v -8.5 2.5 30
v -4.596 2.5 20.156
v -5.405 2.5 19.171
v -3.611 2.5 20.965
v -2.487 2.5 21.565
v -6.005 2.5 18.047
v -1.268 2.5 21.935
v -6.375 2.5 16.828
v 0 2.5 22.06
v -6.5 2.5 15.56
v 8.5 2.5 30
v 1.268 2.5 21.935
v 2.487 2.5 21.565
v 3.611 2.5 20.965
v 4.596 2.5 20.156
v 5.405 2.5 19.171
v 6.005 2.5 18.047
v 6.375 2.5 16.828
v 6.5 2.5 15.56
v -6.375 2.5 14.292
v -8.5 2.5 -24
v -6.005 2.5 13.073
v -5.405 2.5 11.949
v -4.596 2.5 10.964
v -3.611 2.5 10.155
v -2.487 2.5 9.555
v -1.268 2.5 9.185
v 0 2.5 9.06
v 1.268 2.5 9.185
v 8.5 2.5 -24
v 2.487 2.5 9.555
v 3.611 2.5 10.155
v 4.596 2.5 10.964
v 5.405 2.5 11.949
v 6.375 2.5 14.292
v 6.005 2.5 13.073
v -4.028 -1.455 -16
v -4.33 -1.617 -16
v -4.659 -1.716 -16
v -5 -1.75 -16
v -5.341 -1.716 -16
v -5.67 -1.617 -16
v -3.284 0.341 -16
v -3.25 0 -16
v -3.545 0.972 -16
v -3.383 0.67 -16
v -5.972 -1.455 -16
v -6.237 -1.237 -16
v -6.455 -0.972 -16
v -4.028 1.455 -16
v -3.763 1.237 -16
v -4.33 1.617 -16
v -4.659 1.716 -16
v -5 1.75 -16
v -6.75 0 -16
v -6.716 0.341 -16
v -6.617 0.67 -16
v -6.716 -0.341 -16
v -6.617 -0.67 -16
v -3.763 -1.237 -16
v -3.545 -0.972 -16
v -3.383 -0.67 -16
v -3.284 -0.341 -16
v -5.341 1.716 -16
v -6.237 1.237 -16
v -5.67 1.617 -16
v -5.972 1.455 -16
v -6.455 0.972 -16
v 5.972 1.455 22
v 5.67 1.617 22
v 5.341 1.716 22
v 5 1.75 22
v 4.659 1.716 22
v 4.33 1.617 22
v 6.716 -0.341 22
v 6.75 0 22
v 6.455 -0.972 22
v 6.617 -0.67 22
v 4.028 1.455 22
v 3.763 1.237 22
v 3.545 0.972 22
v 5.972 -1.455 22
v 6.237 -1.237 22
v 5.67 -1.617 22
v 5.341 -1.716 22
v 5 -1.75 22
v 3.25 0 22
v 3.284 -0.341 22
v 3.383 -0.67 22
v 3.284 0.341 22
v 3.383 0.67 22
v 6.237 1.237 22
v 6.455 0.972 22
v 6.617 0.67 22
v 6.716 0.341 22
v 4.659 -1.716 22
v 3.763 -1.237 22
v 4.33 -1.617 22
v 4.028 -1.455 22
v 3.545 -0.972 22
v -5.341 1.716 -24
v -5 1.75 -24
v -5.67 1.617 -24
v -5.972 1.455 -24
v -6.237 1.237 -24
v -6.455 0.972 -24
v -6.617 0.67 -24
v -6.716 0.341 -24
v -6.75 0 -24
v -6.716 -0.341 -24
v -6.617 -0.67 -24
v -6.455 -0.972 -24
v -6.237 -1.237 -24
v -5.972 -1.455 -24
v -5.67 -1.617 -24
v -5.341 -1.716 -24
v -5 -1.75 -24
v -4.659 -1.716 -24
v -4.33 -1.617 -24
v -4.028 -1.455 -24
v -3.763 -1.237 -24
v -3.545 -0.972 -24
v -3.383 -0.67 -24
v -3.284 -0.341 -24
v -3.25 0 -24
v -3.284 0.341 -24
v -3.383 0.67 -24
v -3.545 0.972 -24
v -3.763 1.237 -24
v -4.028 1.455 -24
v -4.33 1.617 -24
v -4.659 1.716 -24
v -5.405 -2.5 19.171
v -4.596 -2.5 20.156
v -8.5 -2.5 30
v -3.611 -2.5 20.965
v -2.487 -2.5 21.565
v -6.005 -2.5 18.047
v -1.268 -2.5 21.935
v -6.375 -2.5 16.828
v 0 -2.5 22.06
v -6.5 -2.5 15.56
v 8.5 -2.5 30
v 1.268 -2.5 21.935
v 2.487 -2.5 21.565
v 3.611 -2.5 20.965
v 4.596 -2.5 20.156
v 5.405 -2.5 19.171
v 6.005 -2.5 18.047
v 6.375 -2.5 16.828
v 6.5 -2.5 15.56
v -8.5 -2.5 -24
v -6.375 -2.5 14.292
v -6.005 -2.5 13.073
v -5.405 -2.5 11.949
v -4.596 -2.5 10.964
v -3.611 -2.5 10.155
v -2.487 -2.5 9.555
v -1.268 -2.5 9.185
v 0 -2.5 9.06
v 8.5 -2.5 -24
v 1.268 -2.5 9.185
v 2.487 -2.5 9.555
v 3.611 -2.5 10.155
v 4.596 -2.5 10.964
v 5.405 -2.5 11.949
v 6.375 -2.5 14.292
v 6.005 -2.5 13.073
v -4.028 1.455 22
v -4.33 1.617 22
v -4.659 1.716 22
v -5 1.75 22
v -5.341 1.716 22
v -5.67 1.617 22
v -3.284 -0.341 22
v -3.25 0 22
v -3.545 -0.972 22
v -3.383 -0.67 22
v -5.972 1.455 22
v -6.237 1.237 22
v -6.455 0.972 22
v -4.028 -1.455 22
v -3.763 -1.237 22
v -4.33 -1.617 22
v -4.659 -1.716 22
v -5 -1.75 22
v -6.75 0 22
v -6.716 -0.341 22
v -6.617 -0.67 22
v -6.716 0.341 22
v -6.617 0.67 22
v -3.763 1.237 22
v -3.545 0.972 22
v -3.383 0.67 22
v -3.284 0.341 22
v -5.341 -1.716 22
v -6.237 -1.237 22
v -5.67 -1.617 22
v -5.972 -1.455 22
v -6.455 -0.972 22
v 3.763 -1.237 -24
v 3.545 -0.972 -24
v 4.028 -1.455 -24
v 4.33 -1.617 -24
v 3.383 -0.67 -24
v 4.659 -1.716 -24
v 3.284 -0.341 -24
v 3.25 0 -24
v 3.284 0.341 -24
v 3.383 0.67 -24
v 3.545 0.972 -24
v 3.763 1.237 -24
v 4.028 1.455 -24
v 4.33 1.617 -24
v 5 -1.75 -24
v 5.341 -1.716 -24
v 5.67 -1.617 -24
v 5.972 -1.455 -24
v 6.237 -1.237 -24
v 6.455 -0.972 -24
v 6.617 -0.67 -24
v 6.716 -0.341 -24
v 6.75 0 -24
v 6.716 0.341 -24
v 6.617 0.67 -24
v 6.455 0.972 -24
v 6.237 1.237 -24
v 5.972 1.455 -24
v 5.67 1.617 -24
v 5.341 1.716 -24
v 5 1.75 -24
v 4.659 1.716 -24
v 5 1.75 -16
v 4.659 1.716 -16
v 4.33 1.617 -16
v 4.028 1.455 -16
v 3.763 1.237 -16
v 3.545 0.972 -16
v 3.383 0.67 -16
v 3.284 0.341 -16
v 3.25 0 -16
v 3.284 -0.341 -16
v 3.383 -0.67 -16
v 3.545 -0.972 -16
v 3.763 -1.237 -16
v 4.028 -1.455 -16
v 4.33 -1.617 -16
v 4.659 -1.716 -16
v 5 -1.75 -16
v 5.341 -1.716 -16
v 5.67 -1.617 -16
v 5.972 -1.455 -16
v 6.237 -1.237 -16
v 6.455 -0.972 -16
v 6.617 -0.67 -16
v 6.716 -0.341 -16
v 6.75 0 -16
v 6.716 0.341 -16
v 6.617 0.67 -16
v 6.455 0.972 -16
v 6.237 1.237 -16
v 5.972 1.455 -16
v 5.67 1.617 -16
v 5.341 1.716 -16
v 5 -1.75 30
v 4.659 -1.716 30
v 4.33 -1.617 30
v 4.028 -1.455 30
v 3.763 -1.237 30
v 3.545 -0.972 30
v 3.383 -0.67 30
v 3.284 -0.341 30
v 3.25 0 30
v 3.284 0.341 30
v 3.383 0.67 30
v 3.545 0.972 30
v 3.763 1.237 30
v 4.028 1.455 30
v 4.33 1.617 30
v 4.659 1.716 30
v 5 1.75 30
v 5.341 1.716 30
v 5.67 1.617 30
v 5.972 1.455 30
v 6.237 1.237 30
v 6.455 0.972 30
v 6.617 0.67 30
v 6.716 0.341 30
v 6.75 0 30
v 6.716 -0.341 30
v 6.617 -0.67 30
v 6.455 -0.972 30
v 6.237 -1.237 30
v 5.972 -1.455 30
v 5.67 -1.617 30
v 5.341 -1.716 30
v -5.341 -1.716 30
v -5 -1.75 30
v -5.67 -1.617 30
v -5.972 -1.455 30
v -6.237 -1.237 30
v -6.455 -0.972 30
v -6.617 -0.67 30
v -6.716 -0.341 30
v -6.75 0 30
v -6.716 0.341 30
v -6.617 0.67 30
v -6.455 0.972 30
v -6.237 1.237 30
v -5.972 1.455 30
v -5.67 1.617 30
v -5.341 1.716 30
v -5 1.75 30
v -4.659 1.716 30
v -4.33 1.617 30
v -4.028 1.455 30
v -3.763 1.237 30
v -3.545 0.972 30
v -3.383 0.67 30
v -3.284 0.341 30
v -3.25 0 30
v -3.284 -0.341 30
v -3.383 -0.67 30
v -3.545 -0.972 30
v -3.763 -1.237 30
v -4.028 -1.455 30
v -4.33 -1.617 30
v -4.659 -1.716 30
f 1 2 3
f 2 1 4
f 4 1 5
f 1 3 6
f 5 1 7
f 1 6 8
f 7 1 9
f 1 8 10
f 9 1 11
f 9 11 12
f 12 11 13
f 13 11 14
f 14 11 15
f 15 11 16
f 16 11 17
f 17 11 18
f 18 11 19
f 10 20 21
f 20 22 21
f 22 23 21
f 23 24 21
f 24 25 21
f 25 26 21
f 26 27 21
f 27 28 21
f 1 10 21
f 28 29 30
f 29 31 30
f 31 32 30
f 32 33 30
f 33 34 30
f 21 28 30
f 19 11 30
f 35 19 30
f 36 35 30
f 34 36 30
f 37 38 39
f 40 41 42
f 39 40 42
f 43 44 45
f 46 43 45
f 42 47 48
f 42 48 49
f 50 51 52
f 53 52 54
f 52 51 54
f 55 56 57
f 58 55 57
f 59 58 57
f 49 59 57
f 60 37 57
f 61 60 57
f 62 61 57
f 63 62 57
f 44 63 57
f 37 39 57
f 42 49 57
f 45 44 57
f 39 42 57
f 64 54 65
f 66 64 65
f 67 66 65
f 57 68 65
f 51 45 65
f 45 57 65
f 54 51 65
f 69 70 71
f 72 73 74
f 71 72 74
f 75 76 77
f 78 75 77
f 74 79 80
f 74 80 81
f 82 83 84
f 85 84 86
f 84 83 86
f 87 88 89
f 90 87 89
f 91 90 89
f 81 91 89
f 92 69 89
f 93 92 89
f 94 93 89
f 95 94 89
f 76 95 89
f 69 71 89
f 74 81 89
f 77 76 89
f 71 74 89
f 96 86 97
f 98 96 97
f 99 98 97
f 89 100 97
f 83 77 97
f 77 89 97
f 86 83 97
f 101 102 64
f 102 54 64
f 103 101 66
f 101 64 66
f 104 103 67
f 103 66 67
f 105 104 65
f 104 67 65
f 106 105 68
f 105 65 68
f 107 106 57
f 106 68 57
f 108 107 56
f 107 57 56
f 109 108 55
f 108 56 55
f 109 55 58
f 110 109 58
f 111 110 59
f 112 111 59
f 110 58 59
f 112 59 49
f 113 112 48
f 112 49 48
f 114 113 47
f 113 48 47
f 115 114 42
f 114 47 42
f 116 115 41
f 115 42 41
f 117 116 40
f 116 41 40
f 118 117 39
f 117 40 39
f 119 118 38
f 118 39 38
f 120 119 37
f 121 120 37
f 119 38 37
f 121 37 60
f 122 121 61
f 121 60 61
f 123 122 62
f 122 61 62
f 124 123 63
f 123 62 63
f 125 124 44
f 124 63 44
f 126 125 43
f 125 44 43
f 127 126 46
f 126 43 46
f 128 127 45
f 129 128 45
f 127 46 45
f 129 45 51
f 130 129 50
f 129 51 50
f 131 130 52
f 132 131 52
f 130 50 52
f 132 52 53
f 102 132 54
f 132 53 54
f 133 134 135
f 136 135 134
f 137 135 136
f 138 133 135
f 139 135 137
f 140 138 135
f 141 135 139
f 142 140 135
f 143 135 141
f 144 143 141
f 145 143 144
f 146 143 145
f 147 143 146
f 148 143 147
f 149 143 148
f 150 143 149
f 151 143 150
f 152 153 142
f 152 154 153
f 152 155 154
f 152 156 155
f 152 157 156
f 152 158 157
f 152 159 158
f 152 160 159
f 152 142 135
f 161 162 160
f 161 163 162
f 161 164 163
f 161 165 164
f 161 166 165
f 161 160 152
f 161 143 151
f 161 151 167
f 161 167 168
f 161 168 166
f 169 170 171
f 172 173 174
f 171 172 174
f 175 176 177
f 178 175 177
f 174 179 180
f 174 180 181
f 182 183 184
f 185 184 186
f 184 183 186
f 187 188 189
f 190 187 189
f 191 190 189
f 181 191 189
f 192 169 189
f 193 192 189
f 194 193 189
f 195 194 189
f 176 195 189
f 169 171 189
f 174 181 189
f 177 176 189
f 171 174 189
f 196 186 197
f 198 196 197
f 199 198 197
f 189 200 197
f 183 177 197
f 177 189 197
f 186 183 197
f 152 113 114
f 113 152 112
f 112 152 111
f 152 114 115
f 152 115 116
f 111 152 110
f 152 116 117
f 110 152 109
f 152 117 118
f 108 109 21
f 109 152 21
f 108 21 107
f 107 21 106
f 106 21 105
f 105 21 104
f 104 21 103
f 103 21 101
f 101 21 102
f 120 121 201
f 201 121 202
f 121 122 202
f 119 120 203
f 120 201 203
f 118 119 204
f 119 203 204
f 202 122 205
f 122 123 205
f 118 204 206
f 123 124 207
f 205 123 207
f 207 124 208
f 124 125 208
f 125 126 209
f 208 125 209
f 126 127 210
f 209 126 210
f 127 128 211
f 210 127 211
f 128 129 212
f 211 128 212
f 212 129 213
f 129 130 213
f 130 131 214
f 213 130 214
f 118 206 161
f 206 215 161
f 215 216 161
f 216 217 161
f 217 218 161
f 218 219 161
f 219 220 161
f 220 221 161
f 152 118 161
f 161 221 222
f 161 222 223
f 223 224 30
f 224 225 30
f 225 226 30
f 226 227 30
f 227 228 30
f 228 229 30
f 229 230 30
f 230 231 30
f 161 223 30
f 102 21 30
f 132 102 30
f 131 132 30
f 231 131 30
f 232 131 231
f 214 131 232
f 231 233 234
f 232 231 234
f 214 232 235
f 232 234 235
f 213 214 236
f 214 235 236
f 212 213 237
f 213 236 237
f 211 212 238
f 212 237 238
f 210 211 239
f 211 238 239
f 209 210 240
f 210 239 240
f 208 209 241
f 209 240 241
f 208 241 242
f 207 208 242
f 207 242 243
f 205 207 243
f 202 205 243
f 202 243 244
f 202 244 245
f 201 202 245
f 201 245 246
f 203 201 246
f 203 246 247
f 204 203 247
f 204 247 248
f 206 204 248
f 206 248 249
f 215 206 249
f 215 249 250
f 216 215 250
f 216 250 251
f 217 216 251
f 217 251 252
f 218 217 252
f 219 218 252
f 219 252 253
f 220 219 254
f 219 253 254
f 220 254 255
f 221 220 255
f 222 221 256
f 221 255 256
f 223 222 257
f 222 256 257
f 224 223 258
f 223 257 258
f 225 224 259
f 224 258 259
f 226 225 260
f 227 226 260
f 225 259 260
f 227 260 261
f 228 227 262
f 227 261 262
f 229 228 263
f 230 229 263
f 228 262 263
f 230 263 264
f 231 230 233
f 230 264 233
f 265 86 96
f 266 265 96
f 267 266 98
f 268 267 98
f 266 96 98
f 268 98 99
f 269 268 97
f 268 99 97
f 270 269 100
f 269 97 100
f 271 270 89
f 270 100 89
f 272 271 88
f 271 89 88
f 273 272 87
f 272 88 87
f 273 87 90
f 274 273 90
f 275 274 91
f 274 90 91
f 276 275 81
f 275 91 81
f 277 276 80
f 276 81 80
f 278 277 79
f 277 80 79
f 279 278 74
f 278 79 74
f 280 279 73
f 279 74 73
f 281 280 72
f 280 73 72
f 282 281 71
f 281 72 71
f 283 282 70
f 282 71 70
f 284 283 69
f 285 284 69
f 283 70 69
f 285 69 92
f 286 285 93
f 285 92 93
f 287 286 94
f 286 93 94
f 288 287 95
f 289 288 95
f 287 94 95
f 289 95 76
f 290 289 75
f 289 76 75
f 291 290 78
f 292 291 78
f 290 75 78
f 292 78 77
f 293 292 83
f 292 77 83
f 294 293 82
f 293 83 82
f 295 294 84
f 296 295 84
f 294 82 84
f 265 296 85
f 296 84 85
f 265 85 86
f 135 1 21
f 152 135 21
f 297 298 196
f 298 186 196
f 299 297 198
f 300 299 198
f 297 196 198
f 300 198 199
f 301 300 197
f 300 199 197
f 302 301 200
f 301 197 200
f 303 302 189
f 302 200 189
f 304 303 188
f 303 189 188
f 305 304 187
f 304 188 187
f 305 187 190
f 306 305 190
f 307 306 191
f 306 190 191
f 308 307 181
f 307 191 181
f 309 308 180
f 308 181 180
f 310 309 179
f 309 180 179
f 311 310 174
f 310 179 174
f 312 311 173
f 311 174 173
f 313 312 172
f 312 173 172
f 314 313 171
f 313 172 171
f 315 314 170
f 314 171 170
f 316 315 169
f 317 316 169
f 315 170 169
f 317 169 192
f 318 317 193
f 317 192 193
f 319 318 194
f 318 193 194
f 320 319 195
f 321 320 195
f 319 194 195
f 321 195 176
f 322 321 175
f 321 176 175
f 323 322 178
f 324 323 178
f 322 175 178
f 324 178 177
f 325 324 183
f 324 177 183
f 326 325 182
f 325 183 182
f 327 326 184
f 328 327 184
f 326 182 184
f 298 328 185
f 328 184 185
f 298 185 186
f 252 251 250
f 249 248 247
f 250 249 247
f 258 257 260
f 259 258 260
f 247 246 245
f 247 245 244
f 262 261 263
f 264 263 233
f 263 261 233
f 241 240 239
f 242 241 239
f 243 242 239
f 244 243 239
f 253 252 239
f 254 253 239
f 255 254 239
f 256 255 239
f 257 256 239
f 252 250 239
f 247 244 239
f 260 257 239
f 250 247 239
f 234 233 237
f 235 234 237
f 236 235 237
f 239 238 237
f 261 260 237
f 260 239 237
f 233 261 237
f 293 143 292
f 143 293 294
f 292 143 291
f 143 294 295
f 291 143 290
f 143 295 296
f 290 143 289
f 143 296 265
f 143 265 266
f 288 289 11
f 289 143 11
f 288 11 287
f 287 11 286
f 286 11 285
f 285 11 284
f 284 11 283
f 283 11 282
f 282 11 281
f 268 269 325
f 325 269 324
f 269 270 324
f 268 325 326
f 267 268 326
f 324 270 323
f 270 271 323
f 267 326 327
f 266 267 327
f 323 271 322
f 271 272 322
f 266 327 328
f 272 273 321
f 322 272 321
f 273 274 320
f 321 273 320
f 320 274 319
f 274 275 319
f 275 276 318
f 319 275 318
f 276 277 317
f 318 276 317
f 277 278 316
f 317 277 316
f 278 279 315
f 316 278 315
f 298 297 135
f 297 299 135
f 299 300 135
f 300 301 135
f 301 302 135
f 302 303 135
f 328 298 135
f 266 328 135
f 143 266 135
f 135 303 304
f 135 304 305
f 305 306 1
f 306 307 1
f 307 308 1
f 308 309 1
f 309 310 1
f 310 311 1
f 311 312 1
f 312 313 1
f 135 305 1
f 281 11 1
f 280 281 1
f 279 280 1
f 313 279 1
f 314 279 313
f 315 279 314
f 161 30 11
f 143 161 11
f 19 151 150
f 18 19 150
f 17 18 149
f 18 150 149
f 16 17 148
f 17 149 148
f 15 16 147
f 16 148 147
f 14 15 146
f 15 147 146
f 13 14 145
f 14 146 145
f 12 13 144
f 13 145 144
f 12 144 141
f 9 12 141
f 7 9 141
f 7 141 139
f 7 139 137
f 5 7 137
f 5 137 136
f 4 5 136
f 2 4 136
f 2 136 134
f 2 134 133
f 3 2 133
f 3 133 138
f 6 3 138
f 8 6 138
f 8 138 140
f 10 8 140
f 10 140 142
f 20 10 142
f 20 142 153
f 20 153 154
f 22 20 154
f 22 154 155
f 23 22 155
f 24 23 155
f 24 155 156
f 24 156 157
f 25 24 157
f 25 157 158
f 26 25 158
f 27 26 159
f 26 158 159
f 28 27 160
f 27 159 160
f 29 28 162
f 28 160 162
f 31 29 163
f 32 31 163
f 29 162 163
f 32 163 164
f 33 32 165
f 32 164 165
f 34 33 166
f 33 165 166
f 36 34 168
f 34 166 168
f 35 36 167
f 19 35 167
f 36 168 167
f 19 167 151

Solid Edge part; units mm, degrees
sketch "Sketch1" plane through (0, 0, 0) normal (0, -1, 0) x (1, 0, 0)
  line L0 (-8.5, -24) -> (8.5, -24)
  line L1 (8.5, -24) -> (8.5, 24)
  line L2 (8.5, 24) -> (-8.5, 24)
  line L3 (-8.5, 24) -> (-8.5, -24)
  dimension "D1" = 17
  dimension "D2" = 48
extrude "Protrusion1" add sketch "Sketch1" along normal mid plane 5
sketch "Sketch2" plane through (0, -2.5, 0) normal (0, -1, 0) x (1, 0, 0)
  circle A0 centre (0, 15.56) radius 6.5
  dimension "D1" = 13
  dimension "D2" = 39.56
  dimension "D3" = 8.5
extrude "Extrusionsausschnitt_1" cut sketch "Sketch2" against normal blind 64
hole "Bohrung_1" at (-5, 0, -24) direction (0, 0, 1) diameter 3.5 depth 8
hole "Hole1" at (5, 0, -24) direction (0, 0, 1) diameter 3.5 depth 8
sketch "Sketch3" plane through (0, 0, 24) normal (0, 0, 1) x (1, 0, 0)
  line L0 (-8.5, 2.5) -> (8.5, 2.5)
  line L1 (8.5, 2.5) -> (8.5, -2.5)
  line L2 (8.5, -2.5) -> (-8.5, -2.5)
  line L3 (-8.5, -2.5) -> (-8.5, 2.5)
extrude "Extrusionsausprägung_2" add sketch "Sketch3" along normal blind 6
hole "Bohrung_5" at (-5, 0, 30) direction (0, 0, -1) diameter 3.5 depth 8
hole "Hole2" at (5, 0, 30) direction (0, 0, -1) diameter 3.5 depth 8
properties material "Aluminiumlegierung:3.0205, Al 99.0, EN-AW 1200"
